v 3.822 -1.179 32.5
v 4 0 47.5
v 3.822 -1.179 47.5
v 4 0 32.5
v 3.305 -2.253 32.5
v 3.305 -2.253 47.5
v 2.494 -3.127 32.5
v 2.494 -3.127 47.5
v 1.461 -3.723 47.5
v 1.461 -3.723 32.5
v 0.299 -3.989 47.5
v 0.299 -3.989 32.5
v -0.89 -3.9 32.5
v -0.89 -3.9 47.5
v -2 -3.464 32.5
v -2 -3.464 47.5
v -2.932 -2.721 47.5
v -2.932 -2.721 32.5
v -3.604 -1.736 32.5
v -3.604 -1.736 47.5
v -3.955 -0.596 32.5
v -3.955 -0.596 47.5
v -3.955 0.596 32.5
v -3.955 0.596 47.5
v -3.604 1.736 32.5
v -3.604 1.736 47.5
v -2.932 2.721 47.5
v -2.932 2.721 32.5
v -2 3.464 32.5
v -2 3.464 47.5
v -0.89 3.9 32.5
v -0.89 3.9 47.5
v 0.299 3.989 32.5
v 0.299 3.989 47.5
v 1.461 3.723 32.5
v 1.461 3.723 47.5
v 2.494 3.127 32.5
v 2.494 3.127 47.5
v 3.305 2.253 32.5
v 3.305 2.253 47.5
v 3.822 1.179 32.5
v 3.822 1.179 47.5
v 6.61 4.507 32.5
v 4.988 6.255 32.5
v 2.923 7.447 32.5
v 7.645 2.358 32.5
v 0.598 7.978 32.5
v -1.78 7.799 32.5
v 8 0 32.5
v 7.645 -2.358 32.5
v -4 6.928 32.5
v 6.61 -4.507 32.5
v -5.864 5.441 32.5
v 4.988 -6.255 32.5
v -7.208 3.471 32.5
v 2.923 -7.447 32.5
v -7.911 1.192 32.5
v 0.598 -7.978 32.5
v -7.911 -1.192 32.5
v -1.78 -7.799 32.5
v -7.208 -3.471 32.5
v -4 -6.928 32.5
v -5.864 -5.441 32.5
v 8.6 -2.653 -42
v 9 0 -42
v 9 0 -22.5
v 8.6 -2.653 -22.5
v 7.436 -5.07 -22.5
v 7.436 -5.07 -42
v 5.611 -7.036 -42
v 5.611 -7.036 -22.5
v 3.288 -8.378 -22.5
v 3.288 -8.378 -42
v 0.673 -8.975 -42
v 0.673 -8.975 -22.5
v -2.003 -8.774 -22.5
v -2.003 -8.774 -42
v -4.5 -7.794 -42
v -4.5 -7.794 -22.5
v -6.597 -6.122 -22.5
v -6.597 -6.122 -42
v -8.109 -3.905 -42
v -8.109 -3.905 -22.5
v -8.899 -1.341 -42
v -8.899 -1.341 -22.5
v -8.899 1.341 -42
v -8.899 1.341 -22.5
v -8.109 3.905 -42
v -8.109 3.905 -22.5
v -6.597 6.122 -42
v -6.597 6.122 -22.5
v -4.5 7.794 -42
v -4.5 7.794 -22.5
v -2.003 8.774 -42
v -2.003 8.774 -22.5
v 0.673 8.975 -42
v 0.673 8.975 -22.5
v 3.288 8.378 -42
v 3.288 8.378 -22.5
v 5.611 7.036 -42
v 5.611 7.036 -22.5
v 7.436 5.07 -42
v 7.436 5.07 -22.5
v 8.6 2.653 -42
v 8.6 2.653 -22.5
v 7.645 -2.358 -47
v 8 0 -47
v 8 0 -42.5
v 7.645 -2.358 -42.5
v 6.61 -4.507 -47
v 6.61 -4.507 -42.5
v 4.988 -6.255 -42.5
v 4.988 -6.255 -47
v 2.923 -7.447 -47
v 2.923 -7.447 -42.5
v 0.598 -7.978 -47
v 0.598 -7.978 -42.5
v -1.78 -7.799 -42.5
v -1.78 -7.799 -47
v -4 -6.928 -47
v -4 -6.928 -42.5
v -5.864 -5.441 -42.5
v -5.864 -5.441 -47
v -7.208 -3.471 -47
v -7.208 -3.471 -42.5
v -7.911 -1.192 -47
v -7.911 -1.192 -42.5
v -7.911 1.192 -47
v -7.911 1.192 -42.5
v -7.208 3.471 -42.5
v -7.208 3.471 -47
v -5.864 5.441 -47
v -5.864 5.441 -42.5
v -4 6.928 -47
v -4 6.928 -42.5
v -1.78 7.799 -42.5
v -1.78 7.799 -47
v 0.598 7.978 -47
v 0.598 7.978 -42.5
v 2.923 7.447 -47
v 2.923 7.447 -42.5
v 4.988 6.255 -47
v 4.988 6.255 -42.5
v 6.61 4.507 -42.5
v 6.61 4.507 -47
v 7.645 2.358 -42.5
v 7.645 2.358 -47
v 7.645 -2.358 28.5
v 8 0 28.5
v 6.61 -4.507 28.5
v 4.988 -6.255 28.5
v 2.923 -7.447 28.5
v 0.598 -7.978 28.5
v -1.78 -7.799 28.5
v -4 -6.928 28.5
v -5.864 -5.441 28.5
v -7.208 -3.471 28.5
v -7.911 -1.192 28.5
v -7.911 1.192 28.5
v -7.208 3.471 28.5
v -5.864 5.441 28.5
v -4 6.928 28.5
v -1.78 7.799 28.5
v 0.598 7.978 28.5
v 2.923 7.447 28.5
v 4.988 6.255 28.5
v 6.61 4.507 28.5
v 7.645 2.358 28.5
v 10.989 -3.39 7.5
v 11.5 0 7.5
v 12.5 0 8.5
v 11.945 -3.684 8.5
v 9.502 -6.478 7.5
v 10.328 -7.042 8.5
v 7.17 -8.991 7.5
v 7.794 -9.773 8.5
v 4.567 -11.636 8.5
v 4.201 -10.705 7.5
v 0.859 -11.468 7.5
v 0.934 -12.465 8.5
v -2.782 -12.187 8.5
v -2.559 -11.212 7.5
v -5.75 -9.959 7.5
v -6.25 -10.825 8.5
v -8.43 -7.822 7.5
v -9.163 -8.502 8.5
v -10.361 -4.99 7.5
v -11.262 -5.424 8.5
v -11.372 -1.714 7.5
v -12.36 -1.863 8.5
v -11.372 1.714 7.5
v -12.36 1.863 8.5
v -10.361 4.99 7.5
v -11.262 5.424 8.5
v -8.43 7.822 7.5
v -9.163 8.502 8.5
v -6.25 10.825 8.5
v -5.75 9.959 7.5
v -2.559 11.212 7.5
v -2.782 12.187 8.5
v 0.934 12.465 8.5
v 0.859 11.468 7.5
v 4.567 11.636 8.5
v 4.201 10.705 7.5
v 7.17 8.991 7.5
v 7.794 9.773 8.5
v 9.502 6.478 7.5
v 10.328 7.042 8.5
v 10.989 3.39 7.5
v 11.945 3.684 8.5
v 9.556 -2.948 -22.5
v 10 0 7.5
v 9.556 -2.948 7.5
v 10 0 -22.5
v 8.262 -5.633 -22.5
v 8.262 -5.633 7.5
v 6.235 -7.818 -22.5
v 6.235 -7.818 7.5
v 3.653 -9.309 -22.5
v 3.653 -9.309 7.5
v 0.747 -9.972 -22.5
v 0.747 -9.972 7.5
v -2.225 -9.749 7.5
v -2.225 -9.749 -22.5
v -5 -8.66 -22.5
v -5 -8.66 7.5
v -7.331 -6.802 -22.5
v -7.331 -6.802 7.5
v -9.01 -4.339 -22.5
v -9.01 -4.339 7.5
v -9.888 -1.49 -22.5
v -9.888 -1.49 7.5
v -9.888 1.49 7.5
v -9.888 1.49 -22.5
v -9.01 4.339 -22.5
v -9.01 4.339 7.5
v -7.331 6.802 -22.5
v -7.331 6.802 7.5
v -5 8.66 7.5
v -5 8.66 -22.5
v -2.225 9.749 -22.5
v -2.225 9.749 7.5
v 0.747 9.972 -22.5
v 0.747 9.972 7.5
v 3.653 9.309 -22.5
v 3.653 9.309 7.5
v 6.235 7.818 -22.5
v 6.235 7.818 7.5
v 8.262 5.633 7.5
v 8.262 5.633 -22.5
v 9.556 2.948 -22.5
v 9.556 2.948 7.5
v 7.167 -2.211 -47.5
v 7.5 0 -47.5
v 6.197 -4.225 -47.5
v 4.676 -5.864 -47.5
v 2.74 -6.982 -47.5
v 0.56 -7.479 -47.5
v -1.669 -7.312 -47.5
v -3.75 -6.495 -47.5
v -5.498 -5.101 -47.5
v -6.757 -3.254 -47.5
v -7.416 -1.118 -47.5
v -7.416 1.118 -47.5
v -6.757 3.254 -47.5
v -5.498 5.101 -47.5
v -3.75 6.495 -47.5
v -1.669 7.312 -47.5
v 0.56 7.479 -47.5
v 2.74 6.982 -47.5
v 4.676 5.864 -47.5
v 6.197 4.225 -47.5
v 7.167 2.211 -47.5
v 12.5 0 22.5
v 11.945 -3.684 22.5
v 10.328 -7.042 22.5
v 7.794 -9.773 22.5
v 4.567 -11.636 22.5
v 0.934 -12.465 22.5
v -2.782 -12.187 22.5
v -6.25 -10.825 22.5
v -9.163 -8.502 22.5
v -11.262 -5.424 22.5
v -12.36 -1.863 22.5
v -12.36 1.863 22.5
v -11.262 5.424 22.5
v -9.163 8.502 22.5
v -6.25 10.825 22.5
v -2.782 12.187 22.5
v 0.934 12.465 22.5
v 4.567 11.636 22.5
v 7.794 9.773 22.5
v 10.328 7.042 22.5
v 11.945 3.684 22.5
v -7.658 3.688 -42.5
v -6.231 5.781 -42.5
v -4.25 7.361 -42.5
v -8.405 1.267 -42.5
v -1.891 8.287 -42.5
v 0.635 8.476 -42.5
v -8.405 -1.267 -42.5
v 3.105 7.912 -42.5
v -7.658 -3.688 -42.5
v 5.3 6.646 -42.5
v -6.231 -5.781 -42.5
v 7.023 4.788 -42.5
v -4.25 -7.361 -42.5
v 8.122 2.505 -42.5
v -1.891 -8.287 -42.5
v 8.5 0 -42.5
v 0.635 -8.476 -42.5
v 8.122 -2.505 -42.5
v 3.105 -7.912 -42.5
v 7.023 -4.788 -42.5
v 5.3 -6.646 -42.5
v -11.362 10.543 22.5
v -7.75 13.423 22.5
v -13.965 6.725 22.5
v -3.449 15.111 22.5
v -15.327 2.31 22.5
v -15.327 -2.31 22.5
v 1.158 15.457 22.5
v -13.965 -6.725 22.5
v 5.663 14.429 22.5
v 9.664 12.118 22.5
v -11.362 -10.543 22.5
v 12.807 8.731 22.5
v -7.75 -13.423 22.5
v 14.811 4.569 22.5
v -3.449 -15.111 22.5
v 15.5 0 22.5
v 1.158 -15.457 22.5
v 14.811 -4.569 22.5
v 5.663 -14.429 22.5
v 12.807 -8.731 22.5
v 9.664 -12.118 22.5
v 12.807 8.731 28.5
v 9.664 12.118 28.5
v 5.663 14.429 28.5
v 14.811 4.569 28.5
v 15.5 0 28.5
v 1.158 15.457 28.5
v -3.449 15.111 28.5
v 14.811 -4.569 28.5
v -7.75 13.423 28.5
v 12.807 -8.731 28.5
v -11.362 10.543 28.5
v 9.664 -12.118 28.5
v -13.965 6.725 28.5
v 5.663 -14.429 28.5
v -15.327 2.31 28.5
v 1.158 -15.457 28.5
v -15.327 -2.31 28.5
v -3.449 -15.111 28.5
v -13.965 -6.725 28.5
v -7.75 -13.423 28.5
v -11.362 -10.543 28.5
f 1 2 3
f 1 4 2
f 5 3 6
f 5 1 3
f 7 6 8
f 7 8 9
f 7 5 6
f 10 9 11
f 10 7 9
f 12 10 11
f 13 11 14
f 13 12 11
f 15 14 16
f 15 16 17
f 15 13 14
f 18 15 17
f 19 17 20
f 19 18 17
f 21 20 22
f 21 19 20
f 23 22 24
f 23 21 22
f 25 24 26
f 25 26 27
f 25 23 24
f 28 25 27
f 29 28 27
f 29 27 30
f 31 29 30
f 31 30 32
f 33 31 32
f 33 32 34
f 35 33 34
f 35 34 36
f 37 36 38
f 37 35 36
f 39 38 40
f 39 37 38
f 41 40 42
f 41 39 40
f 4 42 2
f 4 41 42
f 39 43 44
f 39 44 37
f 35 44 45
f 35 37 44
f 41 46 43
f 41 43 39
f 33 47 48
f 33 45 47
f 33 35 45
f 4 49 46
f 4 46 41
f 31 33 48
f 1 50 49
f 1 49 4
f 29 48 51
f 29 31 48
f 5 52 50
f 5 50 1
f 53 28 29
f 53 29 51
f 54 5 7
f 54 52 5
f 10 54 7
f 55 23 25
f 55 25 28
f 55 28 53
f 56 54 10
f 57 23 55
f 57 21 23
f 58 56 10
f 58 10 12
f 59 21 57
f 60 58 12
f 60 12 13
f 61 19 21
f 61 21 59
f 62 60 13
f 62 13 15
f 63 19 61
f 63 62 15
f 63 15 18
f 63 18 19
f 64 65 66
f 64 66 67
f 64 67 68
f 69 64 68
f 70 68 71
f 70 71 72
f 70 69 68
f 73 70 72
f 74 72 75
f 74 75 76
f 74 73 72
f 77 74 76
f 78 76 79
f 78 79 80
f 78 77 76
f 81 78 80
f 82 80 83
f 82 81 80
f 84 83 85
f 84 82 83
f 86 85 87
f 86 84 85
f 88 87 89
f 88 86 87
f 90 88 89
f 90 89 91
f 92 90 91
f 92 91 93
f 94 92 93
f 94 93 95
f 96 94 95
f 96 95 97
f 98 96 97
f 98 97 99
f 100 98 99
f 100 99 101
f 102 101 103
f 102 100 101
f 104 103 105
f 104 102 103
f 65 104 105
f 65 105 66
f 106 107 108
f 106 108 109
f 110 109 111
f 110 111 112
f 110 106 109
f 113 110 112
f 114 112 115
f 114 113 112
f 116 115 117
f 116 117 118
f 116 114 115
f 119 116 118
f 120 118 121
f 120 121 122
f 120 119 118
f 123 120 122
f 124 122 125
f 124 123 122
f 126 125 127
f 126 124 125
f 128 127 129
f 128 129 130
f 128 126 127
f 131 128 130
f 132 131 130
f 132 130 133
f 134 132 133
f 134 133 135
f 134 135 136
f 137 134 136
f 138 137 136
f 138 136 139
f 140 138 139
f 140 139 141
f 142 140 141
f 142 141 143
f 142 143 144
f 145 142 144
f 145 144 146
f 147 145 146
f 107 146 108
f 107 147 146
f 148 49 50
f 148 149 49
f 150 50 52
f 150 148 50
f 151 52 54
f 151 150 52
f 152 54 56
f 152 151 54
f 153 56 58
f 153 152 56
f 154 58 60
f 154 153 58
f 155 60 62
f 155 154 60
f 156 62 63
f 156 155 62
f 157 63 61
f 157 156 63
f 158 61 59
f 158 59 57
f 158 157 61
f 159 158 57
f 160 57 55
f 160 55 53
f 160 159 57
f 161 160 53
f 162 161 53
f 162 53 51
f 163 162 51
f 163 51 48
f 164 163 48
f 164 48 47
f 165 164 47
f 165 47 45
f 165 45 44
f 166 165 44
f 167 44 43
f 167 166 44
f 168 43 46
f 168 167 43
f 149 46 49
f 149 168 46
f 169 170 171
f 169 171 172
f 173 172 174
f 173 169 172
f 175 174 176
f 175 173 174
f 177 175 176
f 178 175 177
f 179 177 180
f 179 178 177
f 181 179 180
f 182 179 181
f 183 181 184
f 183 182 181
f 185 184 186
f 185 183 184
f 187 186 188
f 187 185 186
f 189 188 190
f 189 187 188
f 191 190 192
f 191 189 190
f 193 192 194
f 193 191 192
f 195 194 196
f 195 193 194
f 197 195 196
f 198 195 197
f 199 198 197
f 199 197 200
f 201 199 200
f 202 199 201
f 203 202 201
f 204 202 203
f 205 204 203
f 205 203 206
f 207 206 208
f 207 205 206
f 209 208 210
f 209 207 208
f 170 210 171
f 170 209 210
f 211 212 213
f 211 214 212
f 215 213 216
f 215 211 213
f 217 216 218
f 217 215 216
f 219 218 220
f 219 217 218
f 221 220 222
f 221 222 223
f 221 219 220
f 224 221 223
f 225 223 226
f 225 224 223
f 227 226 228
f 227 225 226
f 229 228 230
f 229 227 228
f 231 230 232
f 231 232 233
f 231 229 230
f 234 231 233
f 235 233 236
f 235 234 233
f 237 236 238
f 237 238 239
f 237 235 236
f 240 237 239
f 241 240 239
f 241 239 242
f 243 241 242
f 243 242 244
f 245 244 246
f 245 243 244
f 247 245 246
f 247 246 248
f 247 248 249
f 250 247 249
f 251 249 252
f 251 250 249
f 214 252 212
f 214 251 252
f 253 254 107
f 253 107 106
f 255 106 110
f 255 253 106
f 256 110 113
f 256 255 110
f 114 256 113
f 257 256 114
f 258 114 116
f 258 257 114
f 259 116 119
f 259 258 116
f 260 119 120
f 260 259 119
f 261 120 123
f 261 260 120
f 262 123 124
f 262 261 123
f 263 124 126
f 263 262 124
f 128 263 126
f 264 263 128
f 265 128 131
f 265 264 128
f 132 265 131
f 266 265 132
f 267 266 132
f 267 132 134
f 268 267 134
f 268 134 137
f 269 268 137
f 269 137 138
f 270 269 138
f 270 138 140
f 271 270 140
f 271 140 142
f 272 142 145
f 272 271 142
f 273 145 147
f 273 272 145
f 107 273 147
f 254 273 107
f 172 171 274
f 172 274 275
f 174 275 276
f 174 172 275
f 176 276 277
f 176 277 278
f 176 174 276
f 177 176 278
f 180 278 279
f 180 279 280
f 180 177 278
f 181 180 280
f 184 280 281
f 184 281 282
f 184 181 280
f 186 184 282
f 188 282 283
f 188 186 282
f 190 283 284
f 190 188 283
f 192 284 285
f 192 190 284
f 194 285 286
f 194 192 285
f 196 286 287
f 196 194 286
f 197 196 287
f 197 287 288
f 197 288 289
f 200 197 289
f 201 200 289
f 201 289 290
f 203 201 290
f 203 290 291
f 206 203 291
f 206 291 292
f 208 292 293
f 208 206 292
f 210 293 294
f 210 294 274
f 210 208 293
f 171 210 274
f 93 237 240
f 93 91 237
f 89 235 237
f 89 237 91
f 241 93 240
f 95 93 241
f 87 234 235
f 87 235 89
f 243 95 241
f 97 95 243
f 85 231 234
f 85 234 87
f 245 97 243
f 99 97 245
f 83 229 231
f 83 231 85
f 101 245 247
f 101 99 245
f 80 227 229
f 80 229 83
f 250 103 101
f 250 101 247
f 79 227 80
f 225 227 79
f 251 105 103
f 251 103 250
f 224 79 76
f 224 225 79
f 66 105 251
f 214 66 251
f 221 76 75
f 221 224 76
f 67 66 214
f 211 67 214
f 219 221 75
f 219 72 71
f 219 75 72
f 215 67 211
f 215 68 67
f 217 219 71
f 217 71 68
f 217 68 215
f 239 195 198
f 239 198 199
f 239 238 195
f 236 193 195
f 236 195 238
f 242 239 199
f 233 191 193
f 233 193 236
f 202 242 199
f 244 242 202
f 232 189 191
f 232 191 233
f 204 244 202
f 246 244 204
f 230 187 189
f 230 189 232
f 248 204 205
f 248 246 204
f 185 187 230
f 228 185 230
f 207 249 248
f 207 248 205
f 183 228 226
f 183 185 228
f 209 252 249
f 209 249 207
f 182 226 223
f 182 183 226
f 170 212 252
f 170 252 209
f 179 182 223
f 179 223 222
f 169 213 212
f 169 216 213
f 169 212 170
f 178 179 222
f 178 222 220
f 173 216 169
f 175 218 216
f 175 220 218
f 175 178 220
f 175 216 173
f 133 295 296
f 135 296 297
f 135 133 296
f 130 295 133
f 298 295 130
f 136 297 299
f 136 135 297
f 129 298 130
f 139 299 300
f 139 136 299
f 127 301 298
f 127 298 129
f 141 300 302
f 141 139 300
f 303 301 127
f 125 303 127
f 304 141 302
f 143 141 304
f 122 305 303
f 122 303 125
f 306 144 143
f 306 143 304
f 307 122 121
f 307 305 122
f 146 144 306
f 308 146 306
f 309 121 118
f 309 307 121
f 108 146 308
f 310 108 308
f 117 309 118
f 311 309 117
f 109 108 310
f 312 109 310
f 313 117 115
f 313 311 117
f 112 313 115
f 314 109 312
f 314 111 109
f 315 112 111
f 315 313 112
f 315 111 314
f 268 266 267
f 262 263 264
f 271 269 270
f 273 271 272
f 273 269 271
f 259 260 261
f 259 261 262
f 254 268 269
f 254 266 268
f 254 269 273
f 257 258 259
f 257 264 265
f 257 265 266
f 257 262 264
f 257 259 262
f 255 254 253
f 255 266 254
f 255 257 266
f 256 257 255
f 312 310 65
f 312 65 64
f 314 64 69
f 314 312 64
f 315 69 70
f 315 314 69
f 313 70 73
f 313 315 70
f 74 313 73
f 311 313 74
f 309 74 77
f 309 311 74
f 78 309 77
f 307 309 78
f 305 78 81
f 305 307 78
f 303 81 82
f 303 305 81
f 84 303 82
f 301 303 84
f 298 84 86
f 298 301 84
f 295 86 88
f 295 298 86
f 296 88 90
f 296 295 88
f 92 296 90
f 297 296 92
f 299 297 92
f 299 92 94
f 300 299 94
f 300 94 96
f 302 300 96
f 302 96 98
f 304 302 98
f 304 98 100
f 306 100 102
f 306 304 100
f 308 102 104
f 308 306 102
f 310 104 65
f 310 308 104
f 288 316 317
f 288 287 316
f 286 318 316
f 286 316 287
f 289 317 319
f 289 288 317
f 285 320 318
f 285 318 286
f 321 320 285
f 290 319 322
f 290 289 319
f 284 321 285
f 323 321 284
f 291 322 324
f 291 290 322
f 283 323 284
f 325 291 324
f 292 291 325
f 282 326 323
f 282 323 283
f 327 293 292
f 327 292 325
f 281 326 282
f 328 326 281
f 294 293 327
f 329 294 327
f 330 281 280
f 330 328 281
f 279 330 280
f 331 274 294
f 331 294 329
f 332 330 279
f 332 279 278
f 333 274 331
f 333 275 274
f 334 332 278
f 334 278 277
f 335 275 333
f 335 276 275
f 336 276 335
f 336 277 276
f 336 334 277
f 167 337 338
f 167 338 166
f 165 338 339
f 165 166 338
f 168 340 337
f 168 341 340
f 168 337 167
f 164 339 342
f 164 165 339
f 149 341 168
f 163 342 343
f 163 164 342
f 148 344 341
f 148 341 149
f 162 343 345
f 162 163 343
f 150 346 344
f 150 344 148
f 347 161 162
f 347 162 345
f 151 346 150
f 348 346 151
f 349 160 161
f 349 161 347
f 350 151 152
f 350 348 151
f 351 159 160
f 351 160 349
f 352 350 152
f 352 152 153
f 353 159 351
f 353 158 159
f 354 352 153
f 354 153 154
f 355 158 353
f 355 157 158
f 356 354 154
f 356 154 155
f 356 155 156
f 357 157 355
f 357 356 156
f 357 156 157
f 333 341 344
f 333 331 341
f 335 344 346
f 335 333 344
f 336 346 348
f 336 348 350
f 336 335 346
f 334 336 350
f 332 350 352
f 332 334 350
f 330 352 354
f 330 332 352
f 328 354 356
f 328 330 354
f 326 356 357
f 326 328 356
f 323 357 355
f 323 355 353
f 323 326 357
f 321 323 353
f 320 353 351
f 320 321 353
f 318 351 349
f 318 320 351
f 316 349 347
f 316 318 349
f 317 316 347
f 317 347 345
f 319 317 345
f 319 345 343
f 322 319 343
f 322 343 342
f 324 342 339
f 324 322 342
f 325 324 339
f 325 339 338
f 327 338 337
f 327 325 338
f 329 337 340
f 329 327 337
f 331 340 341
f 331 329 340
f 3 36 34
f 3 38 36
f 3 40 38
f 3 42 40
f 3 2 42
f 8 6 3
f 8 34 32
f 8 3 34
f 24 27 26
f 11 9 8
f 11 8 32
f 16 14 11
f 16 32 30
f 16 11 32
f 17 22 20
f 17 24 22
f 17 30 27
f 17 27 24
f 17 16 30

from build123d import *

# Parameters (mm, degrees)
CHAMFER_1_SIZE = 1
CHAMFER_2_SIZE = 0.5


with BuildPart() as part:
    # 草图1 → 旋转1 (revolve)
    with BuildSketch(Plane(origin=(0, 0, 0), x_dir=(0, 0, -1), z_dir=(1, 0, 0)), mode=Mode.PRIVATE) as revolve_1_sk:
        Polygon((-47.5, 0), (-47.5, 4), (-32.5, 4), (-32.5, 8), (-28.5, 8), (-28.5, 15.5), (-22.5, 15.5), (-22.5, 12.5), (-7.5, 12.5), (-7.5, 10), (22.5, 10), (22.5, 9), (42.5, 9), (42.5, 8), (47.5, 8), (47.5, 0), align=None)
    revolve(revolve_1_sk.sketch.rotate(Axis((0, 0, 113.714285714), (0, 0, -1)), 90), axis=Axis((0, 0, 113.714285714), (0, 0, -1)))

    # 倒角1
    chamfer_1_edges = [part.edges().sort_by_distance(p)[0] for p in [
        (-12.5, 0, 7.5),
    ]]
    chamfer(chamfer_1_edges, length=CHAMFER_1_SIZE)

    # 倒角2
    chamfer_2_edges = [part.edges().sort_by_distance(p)[0] for p in [
        (-8, 0, -47.5),
        (-9, 0, -42.5),
    ]]
    chamfer(chamfer_2_edges, length=CHAMFER_2_SIZE)


solid = part.part
